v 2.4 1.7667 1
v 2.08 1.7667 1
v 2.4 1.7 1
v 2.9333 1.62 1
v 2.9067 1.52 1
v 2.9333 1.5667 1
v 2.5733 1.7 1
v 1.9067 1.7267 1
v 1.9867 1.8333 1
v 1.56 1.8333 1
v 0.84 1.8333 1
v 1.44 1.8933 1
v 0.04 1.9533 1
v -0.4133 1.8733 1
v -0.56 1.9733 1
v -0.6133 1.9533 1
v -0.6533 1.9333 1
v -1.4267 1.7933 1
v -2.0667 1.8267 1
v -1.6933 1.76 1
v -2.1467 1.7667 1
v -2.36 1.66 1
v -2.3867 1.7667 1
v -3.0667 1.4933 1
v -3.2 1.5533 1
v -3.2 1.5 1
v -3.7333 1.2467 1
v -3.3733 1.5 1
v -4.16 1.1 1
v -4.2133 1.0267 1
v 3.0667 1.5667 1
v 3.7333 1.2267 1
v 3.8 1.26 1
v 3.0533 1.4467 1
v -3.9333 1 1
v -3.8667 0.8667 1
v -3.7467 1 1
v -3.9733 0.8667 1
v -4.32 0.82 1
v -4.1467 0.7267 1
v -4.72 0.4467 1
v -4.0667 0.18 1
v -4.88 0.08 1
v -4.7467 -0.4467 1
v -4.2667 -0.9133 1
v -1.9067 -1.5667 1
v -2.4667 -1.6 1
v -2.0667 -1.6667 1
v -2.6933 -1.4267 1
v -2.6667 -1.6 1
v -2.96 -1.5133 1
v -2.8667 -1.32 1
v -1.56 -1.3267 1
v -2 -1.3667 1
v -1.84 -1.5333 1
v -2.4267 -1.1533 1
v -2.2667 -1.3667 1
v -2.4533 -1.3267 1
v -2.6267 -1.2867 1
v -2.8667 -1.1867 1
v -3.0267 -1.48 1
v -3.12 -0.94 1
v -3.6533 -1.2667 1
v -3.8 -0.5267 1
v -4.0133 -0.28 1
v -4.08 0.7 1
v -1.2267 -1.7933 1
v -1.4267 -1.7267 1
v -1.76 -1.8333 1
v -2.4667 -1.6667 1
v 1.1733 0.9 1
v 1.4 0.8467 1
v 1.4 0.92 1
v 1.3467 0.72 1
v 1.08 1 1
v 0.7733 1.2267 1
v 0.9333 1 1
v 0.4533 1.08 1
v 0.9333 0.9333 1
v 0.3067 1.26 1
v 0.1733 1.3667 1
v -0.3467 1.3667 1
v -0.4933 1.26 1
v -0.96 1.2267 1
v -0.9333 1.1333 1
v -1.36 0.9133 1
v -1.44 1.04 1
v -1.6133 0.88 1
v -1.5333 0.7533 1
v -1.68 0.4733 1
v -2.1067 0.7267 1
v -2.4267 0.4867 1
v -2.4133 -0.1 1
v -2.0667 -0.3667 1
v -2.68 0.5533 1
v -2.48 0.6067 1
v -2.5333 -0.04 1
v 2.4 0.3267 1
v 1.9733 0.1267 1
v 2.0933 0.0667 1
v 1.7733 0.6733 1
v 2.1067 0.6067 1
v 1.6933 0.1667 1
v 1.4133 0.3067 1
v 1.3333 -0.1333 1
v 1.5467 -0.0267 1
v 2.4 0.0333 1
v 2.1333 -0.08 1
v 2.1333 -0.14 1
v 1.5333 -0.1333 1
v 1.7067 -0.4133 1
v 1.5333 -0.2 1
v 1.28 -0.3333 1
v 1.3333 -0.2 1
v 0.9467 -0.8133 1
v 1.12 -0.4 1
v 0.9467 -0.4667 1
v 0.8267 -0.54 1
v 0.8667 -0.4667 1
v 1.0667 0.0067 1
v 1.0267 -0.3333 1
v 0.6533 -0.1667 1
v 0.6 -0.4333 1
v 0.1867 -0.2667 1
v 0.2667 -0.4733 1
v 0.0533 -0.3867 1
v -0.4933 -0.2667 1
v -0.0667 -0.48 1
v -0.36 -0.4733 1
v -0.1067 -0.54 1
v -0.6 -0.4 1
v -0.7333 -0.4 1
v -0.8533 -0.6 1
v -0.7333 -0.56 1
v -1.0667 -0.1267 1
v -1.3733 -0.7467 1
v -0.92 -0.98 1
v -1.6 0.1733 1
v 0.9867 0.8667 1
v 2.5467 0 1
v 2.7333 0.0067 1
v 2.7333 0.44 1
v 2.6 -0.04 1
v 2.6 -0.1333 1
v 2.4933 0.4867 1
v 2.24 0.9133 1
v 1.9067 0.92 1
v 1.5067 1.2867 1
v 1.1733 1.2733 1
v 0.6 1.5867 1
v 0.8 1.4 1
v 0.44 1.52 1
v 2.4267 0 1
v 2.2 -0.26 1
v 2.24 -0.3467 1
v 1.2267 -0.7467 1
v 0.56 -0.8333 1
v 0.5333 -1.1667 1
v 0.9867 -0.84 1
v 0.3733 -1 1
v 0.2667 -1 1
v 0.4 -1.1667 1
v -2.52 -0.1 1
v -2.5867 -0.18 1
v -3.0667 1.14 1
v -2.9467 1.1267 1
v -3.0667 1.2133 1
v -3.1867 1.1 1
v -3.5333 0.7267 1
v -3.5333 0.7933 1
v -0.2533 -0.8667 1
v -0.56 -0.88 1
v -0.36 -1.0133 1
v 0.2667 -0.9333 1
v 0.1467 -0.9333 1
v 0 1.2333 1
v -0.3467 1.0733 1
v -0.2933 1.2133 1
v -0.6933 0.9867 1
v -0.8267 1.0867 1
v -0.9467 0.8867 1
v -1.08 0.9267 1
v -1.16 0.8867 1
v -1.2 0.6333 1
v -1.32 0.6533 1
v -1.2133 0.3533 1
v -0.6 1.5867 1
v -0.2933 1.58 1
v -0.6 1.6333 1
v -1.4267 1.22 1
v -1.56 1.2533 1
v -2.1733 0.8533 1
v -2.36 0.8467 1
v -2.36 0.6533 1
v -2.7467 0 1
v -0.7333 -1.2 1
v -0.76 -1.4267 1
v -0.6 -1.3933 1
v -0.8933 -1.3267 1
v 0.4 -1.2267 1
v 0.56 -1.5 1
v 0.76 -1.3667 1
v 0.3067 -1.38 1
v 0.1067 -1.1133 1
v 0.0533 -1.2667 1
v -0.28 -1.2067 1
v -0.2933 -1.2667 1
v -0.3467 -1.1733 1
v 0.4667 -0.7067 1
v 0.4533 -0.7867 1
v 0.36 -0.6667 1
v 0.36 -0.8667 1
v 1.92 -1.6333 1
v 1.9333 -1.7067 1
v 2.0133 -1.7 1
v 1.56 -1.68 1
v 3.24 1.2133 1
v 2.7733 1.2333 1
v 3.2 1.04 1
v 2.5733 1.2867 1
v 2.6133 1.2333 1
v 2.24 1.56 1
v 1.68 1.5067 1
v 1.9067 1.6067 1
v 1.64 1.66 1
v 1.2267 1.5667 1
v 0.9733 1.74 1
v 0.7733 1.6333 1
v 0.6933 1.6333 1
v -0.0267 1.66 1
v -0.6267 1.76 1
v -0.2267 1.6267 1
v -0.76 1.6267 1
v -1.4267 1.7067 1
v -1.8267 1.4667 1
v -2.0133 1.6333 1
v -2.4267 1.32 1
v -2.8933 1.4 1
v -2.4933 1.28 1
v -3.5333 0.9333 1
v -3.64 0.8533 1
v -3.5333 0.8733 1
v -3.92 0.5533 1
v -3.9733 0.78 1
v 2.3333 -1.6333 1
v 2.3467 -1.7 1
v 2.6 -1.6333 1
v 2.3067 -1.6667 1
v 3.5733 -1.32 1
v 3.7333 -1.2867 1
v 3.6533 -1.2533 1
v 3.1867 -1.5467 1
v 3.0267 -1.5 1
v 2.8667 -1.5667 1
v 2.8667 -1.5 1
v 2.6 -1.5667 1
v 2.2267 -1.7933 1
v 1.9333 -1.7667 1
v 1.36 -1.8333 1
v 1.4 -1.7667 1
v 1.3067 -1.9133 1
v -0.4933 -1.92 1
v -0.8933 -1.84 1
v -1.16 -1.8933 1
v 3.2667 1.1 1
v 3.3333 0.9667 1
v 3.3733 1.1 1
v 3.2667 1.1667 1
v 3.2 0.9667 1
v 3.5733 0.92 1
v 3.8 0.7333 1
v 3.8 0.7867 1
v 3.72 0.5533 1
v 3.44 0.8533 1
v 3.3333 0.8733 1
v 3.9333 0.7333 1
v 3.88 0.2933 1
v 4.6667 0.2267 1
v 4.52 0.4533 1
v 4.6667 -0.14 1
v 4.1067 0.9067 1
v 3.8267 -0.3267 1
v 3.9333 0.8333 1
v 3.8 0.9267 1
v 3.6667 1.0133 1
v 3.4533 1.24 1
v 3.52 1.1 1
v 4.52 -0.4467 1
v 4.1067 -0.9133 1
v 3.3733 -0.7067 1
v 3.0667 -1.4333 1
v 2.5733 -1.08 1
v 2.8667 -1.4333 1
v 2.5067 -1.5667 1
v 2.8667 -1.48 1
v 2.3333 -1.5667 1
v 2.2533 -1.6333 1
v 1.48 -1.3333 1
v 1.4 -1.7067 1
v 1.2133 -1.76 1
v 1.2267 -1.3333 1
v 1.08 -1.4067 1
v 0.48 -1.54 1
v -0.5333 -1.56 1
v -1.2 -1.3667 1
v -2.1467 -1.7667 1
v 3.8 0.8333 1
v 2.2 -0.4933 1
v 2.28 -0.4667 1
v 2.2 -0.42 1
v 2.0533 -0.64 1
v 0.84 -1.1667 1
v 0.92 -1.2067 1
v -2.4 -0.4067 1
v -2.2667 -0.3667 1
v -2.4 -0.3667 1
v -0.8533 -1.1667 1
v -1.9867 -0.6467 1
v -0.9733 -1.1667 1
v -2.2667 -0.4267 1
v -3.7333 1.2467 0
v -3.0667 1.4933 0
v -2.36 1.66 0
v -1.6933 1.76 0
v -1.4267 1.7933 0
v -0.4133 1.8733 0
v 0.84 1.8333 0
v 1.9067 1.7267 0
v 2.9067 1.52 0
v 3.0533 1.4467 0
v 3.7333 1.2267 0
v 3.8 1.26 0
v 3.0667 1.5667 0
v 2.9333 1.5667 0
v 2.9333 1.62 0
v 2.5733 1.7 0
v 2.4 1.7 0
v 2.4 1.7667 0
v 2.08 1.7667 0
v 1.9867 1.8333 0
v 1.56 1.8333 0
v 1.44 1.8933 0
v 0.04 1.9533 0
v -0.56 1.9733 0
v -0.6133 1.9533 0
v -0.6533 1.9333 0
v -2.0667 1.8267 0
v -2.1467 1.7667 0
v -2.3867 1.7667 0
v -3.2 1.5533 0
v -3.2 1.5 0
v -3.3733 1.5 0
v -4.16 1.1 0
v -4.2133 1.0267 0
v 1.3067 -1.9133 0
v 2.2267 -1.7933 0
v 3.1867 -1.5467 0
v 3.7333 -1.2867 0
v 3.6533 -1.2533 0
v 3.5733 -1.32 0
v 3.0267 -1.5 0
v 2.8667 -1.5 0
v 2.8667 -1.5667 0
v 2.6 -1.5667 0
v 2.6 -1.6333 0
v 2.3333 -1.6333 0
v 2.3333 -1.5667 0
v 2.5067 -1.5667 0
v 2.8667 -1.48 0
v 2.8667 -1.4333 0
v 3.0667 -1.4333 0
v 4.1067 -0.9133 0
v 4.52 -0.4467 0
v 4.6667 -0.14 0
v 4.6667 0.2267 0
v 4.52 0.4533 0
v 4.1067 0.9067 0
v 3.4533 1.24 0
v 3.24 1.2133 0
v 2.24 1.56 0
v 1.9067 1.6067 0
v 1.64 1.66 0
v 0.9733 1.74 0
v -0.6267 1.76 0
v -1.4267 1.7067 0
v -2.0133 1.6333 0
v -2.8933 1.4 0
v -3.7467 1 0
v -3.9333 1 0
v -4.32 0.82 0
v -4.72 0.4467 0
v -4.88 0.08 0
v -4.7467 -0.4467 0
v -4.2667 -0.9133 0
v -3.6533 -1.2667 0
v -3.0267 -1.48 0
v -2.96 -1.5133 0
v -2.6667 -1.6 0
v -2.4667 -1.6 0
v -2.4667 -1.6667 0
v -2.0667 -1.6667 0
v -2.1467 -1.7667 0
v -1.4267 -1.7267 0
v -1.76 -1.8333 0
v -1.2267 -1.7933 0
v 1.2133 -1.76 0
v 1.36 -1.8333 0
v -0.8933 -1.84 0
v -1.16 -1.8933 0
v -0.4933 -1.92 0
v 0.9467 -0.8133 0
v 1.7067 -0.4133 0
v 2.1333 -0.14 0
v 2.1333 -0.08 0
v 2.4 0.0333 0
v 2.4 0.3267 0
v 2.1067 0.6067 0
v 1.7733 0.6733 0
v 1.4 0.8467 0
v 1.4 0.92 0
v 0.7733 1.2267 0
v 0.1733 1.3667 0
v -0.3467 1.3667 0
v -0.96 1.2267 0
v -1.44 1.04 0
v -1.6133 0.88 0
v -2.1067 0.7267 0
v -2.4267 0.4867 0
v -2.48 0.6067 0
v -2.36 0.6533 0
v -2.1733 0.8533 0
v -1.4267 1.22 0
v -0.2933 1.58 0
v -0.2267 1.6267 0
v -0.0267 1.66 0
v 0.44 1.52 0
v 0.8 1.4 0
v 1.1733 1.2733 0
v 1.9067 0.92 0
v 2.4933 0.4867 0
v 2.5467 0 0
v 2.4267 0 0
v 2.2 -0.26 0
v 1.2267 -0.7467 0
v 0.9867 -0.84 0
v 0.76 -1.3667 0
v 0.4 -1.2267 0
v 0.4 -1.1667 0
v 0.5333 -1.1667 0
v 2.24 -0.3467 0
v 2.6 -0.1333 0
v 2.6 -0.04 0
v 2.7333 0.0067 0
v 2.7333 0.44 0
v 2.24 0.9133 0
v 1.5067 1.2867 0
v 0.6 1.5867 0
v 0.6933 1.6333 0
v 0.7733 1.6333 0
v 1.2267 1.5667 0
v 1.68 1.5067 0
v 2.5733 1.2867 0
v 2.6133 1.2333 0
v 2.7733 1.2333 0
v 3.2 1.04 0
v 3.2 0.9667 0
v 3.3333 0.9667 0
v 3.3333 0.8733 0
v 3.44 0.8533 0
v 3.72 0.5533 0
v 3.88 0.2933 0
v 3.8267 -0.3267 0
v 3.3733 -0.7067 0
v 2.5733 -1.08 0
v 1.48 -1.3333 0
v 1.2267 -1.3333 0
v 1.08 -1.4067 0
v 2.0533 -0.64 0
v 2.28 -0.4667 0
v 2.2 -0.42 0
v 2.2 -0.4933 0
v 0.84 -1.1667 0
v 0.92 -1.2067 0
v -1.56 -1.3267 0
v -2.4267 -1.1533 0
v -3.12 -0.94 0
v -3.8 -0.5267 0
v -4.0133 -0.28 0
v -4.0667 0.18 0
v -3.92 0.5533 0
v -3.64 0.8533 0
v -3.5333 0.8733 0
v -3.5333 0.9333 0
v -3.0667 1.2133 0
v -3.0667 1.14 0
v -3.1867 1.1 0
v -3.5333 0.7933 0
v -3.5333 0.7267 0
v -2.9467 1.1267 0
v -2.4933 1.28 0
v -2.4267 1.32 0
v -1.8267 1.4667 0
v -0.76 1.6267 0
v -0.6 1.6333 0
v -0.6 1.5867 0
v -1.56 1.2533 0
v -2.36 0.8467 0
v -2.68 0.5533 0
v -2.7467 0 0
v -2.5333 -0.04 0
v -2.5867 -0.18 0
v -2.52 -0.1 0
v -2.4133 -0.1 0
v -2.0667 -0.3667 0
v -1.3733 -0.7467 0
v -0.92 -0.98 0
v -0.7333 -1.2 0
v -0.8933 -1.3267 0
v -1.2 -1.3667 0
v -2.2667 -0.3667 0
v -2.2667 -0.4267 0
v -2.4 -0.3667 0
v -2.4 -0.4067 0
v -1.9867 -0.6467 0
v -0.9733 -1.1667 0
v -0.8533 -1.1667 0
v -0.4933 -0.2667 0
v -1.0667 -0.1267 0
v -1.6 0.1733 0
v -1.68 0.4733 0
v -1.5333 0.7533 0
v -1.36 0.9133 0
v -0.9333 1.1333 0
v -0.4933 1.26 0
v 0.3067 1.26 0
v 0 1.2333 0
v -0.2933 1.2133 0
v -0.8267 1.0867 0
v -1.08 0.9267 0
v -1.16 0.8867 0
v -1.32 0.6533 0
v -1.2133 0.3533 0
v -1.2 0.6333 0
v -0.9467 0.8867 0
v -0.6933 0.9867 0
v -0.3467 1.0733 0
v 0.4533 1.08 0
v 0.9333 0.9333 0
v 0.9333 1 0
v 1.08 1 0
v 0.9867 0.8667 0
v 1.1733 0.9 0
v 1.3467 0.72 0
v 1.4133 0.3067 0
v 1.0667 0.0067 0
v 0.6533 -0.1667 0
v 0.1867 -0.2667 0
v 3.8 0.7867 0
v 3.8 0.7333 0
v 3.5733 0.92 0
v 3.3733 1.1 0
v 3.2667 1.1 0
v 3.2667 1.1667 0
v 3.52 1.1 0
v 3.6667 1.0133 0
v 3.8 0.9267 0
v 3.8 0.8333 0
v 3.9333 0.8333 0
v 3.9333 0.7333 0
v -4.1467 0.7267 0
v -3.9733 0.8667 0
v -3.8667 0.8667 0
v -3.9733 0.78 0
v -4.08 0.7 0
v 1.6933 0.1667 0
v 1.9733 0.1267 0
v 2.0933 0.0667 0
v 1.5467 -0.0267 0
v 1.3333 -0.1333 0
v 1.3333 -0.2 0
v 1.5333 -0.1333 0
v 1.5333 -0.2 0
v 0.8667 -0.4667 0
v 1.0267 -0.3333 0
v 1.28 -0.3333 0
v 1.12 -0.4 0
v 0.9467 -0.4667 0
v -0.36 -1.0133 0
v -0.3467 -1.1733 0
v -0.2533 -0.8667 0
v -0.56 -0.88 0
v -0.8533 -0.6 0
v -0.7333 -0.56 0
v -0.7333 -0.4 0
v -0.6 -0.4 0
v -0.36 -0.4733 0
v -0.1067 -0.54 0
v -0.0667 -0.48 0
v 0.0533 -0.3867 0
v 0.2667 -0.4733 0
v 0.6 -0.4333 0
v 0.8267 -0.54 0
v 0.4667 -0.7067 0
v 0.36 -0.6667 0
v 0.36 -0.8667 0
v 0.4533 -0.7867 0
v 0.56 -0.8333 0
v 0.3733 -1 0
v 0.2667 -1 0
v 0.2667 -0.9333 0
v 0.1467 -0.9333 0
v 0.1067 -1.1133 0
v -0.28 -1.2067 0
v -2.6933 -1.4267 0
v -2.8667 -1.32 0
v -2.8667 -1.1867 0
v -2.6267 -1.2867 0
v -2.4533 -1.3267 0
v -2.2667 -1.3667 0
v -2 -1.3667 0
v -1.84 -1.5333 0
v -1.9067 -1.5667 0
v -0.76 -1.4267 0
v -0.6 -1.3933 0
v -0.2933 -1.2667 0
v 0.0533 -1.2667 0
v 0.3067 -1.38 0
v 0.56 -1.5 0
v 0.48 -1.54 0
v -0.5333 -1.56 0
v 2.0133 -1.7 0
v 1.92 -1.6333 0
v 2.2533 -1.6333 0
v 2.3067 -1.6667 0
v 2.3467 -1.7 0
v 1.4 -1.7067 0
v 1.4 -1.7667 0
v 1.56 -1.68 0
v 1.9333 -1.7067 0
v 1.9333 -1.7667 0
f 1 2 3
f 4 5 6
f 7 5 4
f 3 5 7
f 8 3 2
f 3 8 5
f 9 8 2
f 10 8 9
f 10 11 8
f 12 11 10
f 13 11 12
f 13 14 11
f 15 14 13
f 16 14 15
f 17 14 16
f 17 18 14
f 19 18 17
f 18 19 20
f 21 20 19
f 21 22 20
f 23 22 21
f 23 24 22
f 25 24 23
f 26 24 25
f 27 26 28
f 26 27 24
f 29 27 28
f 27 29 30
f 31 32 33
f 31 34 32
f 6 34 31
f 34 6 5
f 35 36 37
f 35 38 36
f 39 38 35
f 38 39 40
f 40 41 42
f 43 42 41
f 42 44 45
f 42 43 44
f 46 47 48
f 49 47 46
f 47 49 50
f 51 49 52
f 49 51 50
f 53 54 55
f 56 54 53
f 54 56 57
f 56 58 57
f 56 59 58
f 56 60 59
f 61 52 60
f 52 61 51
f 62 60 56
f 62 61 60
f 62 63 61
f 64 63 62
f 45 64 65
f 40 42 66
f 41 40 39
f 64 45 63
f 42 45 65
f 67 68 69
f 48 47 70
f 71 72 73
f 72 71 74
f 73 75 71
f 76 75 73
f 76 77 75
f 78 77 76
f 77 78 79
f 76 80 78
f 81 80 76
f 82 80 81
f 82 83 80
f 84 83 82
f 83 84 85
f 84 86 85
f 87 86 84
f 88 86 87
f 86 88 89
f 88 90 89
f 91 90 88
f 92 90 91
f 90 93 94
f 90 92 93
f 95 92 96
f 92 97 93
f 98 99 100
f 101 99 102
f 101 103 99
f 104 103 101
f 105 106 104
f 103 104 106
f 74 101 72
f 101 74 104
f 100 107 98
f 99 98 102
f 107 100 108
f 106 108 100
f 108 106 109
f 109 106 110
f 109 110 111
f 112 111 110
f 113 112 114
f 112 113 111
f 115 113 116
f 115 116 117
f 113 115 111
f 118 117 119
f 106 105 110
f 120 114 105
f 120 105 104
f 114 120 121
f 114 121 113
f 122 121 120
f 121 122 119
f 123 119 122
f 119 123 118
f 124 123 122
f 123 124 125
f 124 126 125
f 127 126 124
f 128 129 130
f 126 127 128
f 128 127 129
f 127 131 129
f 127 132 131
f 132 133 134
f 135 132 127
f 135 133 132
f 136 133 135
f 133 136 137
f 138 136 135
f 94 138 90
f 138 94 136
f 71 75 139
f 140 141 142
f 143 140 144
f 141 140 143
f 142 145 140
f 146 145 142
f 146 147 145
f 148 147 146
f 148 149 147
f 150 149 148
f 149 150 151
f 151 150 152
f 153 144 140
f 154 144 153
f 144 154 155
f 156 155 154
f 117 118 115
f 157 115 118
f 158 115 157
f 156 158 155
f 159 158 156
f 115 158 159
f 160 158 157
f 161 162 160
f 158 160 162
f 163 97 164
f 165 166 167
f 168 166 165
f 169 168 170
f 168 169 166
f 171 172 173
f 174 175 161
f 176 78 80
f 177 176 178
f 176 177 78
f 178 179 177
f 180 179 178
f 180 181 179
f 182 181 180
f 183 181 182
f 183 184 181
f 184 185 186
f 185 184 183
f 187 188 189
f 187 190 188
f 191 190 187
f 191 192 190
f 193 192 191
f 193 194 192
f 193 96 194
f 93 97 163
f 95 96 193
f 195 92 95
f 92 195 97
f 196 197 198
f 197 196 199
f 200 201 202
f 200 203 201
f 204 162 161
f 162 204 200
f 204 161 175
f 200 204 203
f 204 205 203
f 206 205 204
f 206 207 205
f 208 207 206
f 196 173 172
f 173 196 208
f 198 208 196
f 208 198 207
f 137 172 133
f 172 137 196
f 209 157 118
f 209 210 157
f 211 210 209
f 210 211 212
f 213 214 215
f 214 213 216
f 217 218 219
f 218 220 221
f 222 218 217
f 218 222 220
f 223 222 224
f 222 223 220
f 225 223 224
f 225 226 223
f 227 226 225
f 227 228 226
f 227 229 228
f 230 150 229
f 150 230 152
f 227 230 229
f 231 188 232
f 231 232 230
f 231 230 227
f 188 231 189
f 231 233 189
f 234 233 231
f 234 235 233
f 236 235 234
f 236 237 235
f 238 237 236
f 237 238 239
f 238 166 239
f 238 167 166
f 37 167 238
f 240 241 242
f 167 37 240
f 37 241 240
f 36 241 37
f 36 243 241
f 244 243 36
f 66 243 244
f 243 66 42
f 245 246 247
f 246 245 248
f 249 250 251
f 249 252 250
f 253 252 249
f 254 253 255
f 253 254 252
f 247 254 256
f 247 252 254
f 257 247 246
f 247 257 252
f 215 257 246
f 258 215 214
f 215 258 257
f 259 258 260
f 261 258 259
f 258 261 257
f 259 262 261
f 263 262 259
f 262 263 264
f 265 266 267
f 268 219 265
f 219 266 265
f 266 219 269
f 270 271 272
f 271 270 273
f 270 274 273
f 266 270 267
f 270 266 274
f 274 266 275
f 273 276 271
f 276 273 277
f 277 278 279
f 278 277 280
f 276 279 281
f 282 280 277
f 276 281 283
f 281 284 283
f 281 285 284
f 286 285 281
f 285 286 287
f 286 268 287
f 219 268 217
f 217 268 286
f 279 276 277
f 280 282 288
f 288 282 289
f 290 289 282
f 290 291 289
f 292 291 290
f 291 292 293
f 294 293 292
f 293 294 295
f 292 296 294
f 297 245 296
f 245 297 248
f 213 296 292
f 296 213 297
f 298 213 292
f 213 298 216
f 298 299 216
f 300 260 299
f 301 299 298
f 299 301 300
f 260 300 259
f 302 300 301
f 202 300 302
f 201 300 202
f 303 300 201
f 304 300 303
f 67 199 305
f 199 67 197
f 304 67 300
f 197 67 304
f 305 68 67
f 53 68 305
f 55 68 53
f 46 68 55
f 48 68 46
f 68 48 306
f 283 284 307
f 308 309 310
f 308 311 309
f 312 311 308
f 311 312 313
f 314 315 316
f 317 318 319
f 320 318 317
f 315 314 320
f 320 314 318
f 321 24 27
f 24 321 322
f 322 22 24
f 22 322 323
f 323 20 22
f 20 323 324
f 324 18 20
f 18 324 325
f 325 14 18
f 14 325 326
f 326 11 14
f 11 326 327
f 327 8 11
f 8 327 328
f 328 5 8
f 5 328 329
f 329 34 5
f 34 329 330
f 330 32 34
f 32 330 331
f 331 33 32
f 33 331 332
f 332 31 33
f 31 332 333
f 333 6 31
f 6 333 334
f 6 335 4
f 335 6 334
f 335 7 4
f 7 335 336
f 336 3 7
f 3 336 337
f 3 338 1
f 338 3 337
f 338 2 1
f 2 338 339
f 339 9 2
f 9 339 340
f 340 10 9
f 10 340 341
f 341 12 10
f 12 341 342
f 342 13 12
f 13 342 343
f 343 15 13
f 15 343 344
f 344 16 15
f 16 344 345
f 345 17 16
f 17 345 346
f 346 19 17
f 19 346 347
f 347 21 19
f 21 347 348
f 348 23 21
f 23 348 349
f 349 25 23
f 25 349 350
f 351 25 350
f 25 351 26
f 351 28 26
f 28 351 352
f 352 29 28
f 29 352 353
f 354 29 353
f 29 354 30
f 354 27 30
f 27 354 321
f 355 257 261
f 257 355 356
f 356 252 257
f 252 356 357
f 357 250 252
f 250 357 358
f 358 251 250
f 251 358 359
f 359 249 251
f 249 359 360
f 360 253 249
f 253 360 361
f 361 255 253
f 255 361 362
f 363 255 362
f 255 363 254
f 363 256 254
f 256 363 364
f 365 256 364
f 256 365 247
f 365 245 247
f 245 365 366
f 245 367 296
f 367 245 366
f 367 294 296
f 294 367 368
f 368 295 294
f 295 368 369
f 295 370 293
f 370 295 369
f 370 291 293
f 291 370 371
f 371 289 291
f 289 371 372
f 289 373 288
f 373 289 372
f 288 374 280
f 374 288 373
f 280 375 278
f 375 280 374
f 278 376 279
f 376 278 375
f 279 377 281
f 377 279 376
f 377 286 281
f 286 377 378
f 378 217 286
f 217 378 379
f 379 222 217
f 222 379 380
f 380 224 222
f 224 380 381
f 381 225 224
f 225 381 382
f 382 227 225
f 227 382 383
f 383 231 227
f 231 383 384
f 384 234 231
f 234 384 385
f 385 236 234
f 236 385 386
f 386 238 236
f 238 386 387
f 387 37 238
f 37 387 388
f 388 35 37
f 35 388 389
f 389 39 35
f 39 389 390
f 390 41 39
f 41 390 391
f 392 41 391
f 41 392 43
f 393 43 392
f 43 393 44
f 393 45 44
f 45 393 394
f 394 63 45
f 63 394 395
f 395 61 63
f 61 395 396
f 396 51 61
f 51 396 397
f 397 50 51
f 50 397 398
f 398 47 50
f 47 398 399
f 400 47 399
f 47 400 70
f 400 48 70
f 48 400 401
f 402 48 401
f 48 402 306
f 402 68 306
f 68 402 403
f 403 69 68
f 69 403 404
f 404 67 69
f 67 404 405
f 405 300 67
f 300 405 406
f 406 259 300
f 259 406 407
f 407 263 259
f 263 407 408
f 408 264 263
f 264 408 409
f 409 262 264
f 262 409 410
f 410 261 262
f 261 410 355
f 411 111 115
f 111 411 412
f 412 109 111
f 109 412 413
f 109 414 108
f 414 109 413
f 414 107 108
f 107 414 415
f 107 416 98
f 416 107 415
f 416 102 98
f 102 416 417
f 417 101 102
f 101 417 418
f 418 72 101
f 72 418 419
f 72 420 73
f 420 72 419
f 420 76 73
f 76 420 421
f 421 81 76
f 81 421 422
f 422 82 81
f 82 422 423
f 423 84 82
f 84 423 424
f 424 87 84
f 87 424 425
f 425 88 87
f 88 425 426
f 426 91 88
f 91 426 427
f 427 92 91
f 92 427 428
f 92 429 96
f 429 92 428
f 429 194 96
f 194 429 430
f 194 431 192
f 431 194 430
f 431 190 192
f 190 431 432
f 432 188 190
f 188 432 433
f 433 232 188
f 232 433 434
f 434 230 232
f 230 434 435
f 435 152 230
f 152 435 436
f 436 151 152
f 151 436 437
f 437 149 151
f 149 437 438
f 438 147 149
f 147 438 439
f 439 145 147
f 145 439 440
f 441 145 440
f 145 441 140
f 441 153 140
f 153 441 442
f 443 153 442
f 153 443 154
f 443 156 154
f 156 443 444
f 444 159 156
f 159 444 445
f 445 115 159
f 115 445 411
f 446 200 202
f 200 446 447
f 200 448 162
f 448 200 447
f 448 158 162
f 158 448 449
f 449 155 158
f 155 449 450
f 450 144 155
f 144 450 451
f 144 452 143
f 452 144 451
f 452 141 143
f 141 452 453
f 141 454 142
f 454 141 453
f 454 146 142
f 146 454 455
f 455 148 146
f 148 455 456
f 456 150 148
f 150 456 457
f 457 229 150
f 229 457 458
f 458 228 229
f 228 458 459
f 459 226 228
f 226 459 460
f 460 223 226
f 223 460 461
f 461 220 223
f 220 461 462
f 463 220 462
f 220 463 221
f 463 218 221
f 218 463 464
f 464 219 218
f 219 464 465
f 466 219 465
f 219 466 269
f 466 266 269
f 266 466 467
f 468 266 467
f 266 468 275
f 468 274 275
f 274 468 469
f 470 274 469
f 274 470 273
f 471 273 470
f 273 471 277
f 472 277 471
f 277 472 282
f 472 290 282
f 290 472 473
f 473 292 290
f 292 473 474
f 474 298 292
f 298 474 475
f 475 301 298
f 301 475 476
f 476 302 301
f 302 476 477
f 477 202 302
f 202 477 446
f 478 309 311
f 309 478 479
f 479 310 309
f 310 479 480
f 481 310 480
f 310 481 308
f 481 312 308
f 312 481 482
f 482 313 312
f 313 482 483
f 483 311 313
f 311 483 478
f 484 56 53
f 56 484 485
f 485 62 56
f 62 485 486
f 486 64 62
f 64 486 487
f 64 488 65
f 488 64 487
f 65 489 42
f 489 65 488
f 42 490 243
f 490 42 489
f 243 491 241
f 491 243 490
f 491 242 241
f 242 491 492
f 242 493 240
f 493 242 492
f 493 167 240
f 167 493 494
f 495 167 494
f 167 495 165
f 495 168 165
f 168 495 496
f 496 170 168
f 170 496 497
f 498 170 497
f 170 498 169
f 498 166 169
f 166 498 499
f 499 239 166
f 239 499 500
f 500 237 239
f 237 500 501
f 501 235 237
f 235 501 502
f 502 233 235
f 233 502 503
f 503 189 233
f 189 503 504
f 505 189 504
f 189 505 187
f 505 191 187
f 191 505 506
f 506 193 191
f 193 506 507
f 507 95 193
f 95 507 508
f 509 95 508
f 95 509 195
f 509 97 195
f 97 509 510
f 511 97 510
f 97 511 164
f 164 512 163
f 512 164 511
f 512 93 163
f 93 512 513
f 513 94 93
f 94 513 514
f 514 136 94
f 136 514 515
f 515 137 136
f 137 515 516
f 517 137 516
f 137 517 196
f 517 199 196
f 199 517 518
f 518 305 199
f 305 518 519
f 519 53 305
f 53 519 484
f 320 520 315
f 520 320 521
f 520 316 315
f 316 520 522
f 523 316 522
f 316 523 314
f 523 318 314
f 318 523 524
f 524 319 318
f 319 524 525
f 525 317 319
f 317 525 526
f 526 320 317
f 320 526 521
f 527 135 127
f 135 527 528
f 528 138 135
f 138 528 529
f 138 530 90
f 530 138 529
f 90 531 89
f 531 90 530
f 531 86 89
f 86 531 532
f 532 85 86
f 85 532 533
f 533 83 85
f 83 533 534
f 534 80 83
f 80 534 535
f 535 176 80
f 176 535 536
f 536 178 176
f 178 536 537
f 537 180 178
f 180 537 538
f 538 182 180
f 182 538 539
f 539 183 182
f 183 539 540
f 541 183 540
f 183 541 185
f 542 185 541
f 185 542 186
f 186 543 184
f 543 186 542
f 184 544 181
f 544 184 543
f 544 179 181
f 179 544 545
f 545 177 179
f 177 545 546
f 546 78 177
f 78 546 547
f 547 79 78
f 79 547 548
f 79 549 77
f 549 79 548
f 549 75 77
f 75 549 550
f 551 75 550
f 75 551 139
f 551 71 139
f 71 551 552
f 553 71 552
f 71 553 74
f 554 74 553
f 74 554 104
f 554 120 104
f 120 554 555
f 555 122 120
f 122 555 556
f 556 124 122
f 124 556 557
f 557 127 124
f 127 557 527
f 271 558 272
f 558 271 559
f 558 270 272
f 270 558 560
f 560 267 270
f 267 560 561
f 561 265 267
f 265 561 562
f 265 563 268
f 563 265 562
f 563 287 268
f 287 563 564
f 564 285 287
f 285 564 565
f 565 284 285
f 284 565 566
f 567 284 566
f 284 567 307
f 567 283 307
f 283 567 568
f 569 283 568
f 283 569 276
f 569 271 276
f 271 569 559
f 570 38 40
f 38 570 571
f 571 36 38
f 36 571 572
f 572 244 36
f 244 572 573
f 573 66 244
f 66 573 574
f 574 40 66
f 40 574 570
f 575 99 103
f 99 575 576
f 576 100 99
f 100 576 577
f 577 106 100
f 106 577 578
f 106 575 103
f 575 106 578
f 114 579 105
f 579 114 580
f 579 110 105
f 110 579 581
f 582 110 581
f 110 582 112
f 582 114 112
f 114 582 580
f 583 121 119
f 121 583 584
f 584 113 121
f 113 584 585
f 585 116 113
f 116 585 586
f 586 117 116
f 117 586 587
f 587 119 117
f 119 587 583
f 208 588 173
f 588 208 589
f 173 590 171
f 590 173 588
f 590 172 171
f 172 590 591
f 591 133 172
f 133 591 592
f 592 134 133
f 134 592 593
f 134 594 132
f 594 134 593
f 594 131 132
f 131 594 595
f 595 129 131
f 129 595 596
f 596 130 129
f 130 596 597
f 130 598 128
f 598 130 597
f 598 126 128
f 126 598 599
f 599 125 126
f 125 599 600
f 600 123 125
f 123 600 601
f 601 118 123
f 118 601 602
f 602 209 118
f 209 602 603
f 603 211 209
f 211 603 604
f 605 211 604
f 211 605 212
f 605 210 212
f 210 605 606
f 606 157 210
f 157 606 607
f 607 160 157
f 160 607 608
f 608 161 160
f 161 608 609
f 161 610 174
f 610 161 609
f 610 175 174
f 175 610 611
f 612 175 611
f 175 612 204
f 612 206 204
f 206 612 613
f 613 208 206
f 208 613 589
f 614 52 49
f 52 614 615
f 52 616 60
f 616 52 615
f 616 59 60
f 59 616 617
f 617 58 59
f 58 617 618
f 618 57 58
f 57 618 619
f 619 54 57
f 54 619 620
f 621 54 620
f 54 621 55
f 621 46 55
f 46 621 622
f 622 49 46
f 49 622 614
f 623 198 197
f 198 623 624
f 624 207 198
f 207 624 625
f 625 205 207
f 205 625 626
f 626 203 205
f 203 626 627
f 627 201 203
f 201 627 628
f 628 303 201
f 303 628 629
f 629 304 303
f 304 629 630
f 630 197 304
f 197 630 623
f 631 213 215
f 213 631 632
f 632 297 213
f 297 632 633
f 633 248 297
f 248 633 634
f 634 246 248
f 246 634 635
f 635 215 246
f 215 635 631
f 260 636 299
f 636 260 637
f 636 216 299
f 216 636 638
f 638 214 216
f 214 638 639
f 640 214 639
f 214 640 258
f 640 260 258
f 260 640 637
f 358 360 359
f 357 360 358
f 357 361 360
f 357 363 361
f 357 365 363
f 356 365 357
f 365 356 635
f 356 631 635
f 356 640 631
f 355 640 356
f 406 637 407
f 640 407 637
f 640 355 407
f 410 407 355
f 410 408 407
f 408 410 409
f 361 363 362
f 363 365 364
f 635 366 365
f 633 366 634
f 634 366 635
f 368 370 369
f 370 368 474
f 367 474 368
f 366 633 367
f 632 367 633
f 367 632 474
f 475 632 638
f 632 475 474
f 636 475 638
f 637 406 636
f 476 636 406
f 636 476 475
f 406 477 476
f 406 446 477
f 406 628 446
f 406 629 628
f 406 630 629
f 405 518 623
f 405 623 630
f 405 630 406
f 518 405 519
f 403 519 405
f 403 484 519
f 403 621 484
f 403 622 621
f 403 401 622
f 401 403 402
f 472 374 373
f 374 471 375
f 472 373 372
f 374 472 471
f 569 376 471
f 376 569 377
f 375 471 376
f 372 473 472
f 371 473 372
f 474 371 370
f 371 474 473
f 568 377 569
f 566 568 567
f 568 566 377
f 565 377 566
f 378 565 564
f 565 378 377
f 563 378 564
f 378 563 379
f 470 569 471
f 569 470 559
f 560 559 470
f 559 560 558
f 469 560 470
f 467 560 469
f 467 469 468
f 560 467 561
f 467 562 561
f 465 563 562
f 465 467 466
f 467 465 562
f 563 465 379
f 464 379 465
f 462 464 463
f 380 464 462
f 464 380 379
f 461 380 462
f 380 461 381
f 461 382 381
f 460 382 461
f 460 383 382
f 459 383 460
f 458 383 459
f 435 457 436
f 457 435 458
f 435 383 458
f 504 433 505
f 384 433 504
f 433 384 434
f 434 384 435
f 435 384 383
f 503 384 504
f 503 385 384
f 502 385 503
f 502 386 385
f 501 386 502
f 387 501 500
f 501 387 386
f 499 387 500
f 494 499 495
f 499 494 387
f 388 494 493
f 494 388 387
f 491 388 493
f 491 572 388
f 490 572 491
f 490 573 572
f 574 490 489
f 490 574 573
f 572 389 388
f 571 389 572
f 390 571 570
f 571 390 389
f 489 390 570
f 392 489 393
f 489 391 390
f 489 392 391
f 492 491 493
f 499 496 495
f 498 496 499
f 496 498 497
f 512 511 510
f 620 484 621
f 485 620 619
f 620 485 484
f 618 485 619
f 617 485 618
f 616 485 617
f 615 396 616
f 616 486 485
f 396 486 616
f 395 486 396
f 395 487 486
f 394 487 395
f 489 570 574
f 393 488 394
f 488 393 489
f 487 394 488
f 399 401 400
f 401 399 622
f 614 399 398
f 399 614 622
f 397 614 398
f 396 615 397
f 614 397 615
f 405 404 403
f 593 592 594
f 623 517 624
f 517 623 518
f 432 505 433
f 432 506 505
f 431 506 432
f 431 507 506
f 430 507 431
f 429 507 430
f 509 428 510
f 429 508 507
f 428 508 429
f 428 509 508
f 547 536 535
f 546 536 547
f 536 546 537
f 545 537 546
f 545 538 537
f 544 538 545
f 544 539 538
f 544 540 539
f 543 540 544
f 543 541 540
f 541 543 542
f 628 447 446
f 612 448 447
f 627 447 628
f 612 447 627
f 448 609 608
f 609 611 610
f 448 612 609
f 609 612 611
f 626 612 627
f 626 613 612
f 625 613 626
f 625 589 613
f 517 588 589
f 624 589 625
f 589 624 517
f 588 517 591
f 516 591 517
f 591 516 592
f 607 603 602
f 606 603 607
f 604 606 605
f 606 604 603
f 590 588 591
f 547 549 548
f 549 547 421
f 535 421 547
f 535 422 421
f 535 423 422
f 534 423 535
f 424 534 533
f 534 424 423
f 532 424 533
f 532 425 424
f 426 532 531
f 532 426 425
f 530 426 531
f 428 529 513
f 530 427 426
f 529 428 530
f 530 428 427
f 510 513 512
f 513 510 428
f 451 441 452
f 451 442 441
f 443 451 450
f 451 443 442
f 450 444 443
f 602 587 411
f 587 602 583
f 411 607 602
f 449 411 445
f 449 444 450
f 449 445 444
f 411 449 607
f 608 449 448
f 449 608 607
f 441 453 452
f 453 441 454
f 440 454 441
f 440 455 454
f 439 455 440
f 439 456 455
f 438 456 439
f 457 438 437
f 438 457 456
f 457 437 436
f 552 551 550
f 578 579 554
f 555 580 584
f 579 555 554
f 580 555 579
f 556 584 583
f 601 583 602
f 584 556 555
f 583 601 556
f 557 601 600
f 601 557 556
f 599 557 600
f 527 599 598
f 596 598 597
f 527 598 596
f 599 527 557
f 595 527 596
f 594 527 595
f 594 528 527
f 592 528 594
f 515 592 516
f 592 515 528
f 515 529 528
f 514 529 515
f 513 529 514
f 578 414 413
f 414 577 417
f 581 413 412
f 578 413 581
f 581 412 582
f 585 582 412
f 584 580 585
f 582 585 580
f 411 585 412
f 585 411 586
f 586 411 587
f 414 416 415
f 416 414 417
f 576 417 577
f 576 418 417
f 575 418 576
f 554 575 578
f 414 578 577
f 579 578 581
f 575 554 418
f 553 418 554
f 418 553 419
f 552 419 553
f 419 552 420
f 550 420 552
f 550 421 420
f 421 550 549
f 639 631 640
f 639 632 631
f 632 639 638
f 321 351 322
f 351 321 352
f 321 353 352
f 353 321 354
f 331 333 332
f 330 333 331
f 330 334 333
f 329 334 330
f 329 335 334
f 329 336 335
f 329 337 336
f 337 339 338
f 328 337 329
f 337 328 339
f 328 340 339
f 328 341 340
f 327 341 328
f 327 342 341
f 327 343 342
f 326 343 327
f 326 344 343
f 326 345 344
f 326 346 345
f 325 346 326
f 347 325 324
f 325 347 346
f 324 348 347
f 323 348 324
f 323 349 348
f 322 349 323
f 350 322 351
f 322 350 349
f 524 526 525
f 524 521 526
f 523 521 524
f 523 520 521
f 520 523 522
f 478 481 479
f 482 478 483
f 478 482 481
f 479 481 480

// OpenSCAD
module jaguar2_1()
{
 /* Generated by trace2scad version 20150415
    http://aggregate.org/MAKE/TRACE2SCAD/
    Optimized model has 327/664 original points
 */
 color([0.48, 0.48, 0.48])
 assign(minx=0) /* polygon minx=9 */
 assign(miny=0) /* polygon miny=17 */
 assign(maxx=750) /* polygon maxx=725 */
 assign(maxy=610) /* polygon maxy=601 */
 assign(dx=maxx-minx)
 assign(dy=maxy-miny)
 assign(maxd=((dx>dy)?dx:dy))
 scale([1/maxd, 1/maxd, 1])
 translate([-minx-dx/2, -miny-dy/2, 0])
 linear_extrude(height=1, convexity=327)
 union() {
  union() {
   polygon([[329,598],[326,595],[220,579],[214,570],[196,570],[135,538],[135,530],[122,530],[63,470],[59,459],[95,492],[145,529],[198,554],[248,569],[268,574],[344,586],[438,580],[518,564],[593,533],[604,522],[655,489],[660,494],[605,540],[595,540],[595,548],[568,560],[555,560],[555,570],[531,570],[524,580],[492,580],[483,589],[378,598],[333,601]], convexity=16);
   union() {
    difference() {
     polygon([[298,565],[268,561],[224,550],[158,515],[94,455],[80,455],[51,428],[21,372],[9,317],[19,238],[55,168],[101,115],[148,83],[153,78],[175,65],[190,65],[190,55],[220,55],[214,40],[268,46],[243,30],[283,36],[466,41],[477,30],[308,29],[288,21],[338,17],[473,18],[542,36],[614,73],[655,112],[649,117],[643,107],[602,80],[590,80],[590,70],[570,70],[570,60],[550,60],[550,70],[563,70],[590,83],[590,90],[605,90],[683,168],[714,238],[725,284],[725,339],[714,373],[683,441],[634,491],[618,487],[543,539],[518,546],[498,554],[448,566],[328,569]], convexity=28);
     polygon([[435,515],[463,496],[518,443],[562,378],[566,305],[557,305],[540,266],[467,193],[449,179],[446,183],[503,243],[535,284],[535,293],[555,310],[555,354],[533,396],[508,406],[480,432],[480,443],[433,489],[388,510],[349,510],[303,489],[267,461],[254,437],[217,414],[193,378],[189,396],[198,403],[212,433],[268,488],[353,542],[358,549],[373,554],[408,533]], convexity=14);
     polygon([[330,546],[330,543],[258,493],[198,432],[174,388],[169,305],[185,299],[181,278],[186,290],[194,290],[220,250],[272,193],[306,158],[320,125],[308,106],[285,100],[258,106],[193,132],[141,164],[90,226],[74,263],[70,332],[81,388],[102,433],[110,436],[110,445],[145,487],[145,476],[136,470],[110,424],[110,414],[154,474],[188,497],[193,503],[238,525],[318,549],[330,550]], convexity=15);
     polygon([[467,540],[501,531],[568,498],[571,490],[583,490],[615,461],[615,450],[625,450],[625,436],[633,433],[654,388],[666,349],[662,256],[628,199],[568,143],[486,105],[467,105],[456,94],[432,100],[405,121],[405,130],[415,130],[543,253],[570,285],[570,299],[580,306],[580,371],[543,442],[488,498],[420,543],[427,550],[433,550]], convexity=14);
     polygon([[375,490],[353,487],[313,468],[294,444],[288,438],[276,403],[284,358],[285,400],[304,438],[323,453],[349,466],[409,467],[445,445],[445,455],[456,455],[449,435],[463,440],[476,413],[481,351],[455,306],[424,280],[389,265],[338,265],[295,286],[255,331],[249,376],[260,418],[273,442],[305,475],[338,494],[398,494]], convexity=13);
     polygon([[650,457],[660,444],[660,430],[670,430],[670,415],[660,415],[660,423],[643,443],[628,470],[620,470],[620,480],[639,470]], convexity=10);
     polygon([[77,422],[69,410],[64,414],[77,435],[85,435]], convexity=5);
     polygon([[527,320],[532,315],[491,301],[502,330],[523,324]], convexity=6);
     polygon([[490,280],[490,275],[475,275],[475,285],[490,285]], convexity=5);
     polygon([[459,245],[446,235],[440,235],[452,255],[471,255]], convexity=5);
     polygon([[348,234],[367,224],[370,233],[379,247],[395,234],[420,240],[437,224],[410,199],[402,205],[402,175],[409,187],[417,180],[403,155],[395,155],[395,165],[386,165],[383,138],[354,124],[349,129],[348,153],[356,175],[333,173],[311,215],[320,221],[320,245],[330,245]], convexity=22);
     polygon([[191,106],[205,100],[225,100],[237,75],[232,70],[173,91],[160,107],[160,127],[178,112]], convexity=9);
     polygon([[398,98],[417,80],[411,74],[335,71],[318,91],[330,96],[353,115],[379,115]], convexity=6);
     polygon([[548,55],[551,50],[526,50],[519,60],[544,60]], convexity=5);
     polygon([[520,44],[520,40],[480,40],[480,49],[492,53],[520,49]], convexity=6);
    }
    polygon([[195,247],[195,244],[226,208],[302,130],[311,130],[205,241],[205,250],[195,250]], convexity=7);
    polygon([[540,236],[540,231],[438,130],[444,124],[529,209],[546,235],[540,242]], convexity=7);
   }
  }
 }
}

module jaguar2()
{
 /* all layers combined, scaled to within a 1mm cube */
// scale([1, 1, 1/1])
 scale([10, 5, 1/1])
 difference() {
  union() {
   scale([1,1,2]) translate([0,0,-0.5]) jaguar2_1();
  }
  translate([0,0,-2]) cube([2,2,4],center=true);
 }
}
jaguar2();
